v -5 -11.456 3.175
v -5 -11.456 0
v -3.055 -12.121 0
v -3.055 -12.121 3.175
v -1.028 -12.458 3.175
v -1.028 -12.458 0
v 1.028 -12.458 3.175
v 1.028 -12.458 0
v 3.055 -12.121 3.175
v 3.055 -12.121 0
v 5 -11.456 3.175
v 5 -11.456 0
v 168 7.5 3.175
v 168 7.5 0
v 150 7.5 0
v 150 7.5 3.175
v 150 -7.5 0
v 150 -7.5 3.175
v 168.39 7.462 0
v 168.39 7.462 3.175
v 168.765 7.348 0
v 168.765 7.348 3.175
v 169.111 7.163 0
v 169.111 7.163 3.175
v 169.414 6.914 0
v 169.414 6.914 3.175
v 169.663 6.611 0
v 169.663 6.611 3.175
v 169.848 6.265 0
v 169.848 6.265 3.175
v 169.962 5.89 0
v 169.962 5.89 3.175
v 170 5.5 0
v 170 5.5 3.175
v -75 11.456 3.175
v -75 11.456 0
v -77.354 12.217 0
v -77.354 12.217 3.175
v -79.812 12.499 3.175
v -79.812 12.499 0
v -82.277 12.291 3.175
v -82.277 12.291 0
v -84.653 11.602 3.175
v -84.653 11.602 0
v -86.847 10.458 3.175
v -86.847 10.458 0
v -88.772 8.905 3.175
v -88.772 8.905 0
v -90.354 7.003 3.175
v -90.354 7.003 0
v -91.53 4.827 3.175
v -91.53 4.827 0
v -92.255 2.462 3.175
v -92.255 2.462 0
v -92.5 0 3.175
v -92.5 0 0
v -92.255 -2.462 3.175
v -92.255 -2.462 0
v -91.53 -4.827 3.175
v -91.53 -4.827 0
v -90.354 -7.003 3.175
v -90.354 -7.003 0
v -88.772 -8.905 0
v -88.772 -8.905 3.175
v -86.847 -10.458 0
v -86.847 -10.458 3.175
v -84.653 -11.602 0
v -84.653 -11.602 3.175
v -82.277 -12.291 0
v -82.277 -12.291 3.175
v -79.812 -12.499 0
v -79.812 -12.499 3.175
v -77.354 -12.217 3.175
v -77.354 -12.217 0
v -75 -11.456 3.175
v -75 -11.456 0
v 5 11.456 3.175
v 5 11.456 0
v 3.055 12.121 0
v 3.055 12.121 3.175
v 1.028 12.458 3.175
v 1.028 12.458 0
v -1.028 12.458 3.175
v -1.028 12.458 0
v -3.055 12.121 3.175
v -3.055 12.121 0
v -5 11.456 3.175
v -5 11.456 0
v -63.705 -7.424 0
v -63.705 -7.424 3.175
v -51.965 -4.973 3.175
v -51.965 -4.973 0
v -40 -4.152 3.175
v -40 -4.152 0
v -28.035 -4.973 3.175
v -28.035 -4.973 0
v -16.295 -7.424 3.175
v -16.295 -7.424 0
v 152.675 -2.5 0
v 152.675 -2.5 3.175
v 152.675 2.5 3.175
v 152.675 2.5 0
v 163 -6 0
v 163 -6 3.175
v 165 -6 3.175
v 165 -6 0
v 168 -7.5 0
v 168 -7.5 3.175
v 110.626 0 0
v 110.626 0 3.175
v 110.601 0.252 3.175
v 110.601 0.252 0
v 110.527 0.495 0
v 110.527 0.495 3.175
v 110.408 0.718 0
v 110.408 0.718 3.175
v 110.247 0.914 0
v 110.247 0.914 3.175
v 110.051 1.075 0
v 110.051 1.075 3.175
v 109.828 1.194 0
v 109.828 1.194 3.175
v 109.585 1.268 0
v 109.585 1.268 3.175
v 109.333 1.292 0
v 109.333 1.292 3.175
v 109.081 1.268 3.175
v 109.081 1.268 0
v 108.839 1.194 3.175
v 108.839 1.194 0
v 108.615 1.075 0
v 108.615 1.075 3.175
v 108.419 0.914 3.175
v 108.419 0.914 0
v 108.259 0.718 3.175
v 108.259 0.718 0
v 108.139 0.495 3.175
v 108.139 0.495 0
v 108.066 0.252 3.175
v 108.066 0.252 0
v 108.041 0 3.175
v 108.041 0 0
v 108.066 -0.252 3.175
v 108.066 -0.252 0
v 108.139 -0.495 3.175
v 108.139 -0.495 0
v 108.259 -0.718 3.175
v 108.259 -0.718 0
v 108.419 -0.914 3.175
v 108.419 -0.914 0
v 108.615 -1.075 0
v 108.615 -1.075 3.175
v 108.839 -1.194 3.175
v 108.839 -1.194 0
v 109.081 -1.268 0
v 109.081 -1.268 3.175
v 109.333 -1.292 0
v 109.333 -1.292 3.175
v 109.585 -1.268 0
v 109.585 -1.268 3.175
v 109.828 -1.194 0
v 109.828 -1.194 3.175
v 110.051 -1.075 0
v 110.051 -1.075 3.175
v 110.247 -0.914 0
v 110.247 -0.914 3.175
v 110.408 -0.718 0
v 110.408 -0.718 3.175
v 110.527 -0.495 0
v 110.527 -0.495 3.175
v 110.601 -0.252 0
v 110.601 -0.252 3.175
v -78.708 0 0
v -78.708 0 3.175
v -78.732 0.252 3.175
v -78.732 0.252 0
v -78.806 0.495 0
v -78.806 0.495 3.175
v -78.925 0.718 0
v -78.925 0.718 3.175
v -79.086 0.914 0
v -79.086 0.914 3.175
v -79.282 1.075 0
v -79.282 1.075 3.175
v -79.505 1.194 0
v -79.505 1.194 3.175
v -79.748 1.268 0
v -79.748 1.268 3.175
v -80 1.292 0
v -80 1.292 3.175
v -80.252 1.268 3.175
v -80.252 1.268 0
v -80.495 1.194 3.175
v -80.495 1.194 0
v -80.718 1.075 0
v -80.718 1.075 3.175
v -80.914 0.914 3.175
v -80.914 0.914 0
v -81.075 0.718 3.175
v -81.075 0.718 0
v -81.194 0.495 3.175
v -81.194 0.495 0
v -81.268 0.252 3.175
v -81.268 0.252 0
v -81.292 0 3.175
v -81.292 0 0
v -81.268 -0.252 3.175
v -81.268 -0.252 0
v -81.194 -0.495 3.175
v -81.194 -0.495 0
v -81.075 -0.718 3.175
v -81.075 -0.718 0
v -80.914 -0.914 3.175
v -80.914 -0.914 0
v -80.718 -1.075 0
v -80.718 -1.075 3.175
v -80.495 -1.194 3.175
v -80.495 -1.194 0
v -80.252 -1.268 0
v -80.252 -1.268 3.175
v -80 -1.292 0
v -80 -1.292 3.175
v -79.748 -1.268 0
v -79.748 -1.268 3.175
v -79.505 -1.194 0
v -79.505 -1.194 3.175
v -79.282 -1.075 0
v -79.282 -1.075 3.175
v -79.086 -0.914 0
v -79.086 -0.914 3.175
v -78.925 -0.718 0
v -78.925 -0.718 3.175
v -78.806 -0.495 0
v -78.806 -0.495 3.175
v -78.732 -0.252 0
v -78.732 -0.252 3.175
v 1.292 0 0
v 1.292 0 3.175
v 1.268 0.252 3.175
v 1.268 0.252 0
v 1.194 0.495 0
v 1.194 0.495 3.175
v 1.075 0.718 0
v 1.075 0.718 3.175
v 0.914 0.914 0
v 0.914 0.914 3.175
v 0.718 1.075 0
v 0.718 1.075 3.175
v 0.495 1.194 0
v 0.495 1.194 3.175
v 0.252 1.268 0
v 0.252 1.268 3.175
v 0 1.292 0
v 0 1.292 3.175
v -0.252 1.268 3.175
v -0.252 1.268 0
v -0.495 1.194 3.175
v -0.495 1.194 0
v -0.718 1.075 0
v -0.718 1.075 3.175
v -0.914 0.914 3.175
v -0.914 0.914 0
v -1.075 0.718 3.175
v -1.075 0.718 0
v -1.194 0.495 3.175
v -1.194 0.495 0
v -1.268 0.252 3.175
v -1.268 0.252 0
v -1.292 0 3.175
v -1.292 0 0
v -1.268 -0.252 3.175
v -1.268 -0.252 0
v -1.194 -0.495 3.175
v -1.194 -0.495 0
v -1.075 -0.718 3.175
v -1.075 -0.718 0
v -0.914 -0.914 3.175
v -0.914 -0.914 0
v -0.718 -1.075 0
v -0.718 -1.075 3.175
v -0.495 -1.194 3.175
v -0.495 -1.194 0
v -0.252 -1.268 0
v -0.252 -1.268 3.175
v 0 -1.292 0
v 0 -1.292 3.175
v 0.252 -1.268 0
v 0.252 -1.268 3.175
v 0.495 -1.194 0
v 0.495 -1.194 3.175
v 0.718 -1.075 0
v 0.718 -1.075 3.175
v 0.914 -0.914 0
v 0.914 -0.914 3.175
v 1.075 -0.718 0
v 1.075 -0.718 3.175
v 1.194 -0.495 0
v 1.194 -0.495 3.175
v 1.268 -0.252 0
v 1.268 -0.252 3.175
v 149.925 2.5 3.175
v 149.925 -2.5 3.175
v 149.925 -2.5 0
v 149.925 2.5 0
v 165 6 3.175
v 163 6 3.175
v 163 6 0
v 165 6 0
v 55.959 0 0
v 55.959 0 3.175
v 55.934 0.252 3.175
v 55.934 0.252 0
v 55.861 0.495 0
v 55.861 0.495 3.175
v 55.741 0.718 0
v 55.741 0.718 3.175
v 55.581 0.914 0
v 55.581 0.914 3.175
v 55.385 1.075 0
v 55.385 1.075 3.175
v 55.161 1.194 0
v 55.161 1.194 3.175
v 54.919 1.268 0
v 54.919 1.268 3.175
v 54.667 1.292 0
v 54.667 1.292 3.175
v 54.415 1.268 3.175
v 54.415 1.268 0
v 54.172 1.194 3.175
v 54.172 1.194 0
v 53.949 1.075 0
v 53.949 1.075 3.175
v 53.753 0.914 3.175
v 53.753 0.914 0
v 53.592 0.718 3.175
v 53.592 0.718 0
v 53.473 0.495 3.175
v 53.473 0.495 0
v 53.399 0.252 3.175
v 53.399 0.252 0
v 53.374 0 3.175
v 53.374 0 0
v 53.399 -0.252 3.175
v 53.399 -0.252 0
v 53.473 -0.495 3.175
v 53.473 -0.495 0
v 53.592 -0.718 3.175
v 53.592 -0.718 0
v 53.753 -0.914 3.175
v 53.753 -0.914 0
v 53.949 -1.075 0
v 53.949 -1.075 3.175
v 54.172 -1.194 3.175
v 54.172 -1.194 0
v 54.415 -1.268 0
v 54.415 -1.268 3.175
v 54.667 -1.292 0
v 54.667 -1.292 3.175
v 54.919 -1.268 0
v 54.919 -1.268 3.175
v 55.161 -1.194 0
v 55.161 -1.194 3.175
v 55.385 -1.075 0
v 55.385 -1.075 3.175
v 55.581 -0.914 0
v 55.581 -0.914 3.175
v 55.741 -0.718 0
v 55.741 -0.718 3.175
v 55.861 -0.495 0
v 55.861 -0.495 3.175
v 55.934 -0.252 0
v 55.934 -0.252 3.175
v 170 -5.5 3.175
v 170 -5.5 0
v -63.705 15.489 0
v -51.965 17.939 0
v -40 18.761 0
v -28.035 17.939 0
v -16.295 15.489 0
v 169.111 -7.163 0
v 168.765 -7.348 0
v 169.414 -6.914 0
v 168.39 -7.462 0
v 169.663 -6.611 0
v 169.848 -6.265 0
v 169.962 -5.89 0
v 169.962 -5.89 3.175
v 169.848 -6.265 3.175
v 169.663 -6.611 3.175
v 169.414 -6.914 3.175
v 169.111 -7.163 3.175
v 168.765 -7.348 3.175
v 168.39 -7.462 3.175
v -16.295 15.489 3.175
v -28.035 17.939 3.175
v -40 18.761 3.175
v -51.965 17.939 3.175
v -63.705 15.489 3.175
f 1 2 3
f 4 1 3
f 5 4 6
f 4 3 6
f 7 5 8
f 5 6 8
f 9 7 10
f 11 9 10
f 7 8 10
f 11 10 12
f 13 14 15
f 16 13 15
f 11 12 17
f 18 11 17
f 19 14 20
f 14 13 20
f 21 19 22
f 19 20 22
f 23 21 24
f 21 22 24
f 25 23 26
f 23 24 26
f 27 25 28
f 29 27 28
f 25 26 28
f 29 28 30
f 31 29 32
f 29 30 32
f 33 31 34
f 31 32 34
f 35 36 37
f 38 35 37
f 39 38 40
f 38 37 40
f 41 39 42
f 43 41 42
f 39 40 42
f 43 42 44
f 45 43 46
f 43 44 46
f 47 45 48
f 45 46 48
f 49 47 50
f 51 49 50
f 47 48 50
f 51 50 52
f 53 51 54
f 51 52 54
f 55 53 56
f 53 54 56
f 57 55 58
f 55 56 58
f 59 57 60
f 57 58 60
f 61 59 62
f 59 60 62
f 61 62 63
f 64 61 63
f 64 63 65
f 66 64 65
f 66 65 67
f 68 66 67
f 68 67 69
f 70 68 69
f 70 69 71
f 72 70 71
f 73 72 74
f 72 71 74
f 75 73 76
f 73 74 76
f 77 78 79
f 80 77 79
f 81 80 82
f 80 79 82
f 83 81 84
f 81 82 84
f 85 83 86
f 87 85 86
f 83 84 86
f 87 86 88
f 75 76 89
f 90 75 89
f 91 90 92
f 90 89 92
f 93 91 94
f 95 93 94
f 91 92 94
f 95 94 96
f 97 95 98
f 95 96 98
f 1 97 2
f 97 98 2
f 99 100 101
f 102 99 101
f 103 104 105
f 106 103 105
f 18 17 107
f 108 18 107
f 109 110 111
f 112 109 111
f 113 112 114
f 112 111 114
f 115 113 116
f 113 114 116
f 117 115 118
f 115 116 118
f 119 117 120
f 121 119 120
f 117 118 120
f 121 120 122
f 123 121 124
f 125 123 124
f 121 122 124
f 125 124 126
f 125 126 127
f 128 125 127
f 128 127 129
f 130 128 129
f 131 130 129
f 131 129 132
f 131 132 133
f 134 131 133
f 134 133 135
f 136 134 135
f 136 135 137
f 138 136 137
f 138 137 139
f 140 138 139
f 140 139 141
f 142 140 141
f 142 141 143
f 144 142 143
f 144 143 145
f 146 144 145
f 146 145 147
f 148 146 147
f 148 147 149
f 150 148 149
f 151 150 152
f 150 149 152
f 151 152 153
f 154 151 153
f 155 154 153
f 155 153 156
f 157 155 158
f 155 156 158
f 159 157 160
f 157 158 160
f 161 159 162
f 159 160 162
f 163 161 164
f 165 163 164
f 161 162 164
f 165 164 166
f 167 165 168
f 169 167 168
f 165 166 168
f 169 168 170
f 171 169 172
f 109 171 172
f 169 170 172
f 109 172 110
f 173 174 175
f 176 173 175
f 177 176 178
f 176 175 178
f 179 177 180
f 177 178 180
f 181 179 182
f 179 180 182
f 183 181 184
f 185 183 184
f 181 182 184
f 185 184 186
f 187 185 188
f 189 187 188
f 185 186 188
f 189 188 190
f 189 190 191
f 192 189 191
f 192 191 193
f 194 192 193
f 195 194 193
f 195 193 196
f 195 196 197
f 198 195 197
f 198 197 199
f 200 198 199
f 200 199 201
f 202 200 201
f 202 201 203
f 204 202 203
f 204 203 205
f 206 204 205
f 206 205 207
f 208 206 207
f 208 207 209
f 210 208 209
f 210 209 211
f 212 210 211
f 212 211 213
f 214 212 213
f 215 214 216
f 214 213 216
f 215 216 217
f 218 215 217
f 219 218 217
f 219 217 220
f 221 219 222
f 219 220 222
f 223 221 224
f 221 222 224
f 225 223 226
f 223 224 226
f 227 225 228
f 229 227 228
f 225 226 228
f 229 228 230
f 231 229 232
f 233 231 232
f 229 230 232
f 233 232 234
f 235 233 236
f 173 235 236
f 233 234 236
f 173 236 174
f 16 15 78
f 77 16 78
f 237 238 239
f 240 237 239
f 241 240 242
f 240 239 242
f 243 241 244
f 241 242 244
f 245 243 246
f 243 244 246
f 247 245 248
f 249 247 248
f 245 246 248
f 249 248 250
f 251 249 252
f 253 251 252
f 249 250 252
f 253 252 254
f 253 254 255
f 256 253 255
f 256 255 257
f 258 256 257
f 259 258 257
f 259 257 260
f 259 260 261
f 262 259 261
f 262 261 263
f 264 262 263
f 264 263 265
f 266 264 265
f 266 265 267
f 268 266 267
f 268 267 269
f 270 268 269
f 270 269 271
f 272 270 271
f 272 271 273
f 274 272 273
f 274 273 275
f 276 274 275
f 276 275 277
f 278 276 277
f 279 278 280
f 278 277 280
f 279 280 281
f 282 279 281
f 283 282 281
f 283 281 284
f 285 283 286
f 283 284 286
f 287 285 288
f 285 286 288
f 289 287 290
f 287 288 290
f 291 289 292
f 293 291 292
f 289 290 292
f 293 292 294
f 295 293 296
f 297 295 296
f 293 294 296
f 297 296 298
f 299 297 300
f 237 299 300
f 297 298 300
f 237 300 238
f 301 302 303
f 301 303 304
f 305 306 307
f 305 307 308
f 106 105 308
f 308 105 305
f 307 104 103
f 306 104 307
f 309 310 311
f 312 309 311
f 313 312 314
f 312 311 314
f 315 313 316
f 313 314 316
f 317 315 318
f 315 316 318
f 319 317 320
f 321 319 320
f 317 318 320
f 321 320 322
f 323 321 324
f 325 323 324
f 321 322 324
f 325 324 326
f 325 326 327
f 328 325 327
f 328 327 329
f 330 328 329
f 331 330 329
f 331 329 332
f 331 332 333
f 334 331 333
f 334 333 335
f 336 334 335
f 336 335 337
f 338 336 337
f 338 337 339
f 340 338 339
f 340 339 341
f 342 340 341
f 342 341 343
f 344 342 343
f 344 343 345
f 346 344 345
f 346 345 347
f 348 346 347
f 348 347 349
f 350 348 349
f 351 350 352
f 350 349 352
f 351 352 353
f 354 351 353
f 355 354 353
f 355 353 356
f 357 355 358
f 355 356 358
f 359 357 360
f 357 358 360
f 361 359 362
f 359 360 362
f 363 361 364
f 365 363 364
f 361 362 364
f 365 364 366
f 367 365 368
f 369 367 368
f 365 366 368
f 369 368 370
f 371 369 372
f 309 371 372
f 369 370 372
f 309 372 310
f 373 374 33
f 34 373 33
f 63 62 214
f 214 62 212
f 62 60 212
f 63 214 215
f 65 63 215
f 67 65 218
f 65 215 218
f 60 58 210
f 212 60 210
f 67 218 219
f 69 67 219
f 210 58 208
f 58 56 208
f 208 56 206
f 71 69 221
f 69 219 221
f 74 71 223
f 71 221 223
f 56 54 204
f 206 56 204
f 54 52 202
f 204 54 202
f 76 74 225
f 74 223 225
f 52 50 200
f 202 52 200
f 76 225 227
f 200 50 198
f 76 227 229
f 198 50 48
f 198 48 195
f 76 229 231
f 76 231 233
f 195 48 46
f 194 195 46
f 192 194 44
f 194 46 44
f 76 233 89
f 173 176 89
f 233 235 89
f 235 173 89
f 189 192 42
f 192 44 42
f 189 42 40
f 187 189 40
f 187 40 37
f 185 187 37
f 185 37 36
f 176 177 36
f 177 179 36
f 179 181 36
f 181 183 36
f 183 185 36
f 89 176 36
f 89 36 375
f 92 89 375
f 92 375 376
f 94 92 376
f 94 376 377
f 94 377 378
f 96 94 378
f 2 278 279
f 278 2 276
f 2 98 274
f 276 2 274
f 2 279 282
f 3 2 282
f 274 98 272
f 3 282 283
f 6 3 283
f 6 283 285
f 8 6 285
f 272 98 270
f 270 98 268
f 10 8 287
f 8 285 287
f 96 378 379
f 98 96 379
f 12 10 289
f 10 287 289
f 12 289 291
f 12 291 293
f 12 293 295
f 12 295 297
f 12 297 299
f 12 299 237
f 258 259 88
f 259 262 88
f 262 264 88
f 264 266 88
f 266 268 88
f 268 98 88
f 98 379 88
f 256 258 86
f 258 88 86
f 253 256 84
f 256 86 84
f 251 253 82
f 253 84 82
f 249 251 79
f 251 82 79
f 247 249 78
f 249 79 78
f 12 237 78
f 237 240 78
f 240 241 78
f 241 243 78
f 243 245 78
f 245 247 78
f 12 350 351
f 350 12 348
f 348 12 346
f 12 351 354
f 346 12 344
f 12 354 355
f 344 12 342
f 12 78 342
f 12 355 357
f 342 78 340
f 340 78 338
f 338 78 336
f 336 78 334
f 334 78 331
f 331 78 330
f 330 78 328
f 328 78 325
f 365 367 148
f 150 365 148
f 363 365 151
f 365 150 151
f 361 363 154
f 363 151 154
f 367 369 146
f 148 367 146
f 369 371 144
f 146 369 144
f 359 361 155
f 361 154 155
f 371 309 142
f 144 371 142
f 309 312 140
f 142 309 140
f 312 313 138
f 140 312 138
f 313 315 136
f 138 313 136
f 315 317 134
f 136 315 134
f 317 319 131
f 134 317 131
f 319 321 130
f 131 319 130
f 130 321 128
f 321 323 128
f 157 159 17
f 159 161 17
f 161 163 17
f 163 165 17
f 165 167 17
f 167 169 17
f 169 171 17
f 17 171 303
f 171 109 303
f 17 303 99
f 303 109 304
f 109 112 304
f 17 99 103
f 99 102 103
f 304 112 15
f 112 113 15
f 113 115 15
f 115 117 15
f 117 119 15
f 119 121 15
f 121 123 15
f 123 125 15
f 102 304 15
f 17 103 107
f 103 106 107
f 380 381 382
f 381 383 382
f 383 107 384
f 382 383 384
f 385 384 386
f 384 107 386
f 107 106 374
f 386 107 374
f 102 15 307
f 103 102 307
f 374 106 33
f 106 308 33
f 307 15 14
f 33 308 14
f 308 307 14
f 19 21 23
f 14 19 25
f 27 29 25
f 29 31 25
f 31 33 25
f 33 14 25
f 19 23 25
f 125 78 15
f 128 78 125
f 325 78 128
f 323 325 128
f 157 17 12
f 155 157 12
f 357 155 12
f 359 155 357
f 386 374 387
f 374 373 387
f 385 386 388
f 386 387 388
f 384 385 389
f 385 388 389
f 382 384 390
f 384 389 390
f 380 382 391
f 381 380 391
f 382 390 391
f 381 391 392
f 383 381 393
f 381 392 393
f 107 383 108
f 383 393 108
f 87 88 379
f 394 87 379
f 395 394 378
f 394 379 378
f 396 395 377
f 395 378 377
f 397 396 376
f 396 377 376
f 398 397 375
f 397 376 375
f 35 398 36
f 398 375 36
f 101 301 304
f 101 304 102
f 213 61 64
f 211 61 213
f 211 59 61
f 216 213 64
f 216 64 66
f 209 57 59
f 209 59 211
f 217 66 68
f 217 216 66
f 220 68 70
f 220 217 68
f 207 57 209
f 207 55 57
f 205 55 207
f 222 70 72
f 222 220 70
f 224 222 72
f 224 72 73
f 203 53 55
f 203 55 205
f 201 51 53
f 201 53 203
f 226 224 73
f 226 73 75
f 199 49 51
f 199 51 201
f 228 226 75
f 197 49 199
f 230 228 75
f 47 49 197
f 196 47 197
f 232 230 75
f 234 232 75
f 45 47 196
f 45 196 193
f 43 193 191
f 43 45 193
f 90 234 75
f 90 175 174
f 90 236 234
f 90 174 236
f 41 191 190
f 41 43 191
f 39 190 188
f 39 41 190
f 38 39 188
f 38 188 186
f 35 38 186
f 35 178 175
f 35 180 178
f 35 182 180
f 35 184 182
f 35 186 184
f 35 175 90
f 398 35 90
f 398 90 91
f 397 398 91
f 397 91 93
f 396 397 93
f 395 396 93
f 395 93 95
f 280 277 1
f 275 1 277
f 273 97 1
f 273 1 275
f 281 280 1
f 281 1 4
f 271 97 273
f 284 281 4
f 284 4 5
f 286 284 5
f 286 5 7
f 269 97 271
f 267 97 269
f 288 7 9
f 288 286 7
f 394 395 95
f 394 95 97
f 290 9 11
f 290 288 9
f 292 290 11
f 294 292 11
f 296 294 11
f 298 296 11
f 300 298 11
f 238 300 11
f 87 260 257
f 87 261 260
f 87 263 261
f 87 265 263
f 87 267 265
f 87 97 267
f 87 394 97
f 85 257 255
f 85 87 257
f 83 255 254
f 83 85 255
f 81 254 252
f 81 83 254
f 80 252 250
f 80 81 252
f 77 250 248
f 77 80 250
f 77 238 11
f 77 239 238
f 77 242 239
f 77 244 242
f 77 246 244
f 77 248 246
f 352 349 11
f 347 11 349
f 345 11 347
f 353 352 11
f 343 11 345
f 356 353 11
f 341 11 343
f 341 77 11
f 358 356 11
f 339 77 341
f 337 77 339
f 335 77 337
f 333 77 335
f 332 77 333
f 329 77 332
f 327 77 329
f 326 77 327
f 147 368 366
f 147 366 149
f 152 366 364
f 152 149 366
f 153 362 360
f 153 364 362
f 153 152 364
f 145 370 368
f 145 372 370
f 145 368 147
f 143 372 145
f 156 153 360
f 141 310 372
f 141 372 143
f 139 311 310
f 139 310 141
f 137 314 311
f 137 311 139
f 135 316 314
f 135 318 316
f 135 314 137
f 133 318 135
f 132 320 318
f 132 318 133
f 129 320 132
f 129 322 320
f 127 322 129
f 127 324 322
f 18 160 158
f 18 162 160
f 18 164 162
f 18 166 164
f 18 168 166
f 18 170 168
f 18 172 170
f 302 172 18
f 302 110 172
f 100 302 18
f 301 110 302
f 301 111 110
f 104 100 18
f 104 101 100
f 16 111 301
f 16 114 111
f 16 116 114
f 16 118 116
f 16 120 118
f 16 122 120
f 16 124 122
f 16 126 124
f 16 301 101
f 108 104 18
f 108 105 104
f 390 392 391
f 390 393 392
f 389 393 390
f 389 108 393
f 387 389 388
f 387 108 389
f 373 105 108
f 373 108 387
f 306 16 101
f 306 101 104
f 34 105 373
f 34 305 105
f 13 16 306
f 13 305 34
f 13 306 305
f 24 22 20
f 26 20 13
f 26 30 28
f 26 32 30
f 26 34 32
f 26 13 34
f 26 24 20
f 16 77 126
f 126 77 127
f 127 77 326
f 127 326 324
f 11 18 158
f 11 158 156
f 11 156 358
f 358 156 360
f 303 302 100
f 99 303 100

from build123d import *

# Parameters (mm, degrees)
BOSS_EXTRUDE1_DEPTH = 3.175
SKETCH2_R           = 1.2925
SKETCH2_W           = 2
SKETCH2_H           = 12
SKETCH2_W_2         = 2.75
SKETCH2_H_2         = 5
CUT_EXTRUDE1_DEPTH  = 172.061595414
FILLET1_R           = 2


with BuildPart() as part:
    # Sketch1 → Boss-Extrude1 (new body)
    with BuildSketch(Plane.XY):
        with BuildLine():
            Line((150, 7.5), (5, 11.456439237))
            ThreePointArc((5, 11.456439237), (0, 12.5), (-5, 11.456439237))
            ThreePointArc((-5, 11.456439237), (-40, 18.761364576), (-75, 11.456439237))
            ThreePointArc((-75, 11.456439237), (-92.5, 0), (-75, -11.456439237))
            ThreePointArc((-75, -11.456439237), (-40, -4.151513899), (-5, -11.456439237))
            ThreePointArc((-5, -11.456439237), (0, -12.5), (5, -11.456439237))
            Line((5, -11.456439237), (150, -7.5))
            Line((150, -7.5), (170, -7.5))
            Line((170, -7.5), (170, 7.5))
            Line((170, 7.5), (150, 7.5))
        make_face()
    extrude(amount=BOSS_EXTRUDE1_DEPTH)

    # Sketch2 → Cut-Extrude1 (cut, through all)
    with BuildSketch(Plane.XY.offset(3.175)):
        with Locations((-80, 0)):
            Circle(SKETCH2_R)
        with Locations((54.666666667, 0)):
            Circle(SKETCH2_R)
        with Locations((109.333333333, 0)):
            Circle(SKETCH2_R)
        Circle(SKETCH2_R)
        with Locations((164, 0)):
            Rectangle(SKETCH2_W, SKETCH2_H)
        with Locations((151.3, 0)):
            Rectangle(SKETCH2_W_2, SKETCH2_H_2)
    extrude(amount=-CUT_EXTRUDE1_DEPTH, mode=Mode.SUBTRACT)

    # Fillet1
    fillet1_edges = [part.edges().sort_by_distance(p)[0] for p in [
        (170, 7.5, 1.5875),
        (170, -7.5, 1.5875),
        (150, -7.5, 1.5875),
        (150, 7.5, 1.5875),
    ]]
    fillet(fillet1_edges, radius=FILLET1_R)


solid = part.part
